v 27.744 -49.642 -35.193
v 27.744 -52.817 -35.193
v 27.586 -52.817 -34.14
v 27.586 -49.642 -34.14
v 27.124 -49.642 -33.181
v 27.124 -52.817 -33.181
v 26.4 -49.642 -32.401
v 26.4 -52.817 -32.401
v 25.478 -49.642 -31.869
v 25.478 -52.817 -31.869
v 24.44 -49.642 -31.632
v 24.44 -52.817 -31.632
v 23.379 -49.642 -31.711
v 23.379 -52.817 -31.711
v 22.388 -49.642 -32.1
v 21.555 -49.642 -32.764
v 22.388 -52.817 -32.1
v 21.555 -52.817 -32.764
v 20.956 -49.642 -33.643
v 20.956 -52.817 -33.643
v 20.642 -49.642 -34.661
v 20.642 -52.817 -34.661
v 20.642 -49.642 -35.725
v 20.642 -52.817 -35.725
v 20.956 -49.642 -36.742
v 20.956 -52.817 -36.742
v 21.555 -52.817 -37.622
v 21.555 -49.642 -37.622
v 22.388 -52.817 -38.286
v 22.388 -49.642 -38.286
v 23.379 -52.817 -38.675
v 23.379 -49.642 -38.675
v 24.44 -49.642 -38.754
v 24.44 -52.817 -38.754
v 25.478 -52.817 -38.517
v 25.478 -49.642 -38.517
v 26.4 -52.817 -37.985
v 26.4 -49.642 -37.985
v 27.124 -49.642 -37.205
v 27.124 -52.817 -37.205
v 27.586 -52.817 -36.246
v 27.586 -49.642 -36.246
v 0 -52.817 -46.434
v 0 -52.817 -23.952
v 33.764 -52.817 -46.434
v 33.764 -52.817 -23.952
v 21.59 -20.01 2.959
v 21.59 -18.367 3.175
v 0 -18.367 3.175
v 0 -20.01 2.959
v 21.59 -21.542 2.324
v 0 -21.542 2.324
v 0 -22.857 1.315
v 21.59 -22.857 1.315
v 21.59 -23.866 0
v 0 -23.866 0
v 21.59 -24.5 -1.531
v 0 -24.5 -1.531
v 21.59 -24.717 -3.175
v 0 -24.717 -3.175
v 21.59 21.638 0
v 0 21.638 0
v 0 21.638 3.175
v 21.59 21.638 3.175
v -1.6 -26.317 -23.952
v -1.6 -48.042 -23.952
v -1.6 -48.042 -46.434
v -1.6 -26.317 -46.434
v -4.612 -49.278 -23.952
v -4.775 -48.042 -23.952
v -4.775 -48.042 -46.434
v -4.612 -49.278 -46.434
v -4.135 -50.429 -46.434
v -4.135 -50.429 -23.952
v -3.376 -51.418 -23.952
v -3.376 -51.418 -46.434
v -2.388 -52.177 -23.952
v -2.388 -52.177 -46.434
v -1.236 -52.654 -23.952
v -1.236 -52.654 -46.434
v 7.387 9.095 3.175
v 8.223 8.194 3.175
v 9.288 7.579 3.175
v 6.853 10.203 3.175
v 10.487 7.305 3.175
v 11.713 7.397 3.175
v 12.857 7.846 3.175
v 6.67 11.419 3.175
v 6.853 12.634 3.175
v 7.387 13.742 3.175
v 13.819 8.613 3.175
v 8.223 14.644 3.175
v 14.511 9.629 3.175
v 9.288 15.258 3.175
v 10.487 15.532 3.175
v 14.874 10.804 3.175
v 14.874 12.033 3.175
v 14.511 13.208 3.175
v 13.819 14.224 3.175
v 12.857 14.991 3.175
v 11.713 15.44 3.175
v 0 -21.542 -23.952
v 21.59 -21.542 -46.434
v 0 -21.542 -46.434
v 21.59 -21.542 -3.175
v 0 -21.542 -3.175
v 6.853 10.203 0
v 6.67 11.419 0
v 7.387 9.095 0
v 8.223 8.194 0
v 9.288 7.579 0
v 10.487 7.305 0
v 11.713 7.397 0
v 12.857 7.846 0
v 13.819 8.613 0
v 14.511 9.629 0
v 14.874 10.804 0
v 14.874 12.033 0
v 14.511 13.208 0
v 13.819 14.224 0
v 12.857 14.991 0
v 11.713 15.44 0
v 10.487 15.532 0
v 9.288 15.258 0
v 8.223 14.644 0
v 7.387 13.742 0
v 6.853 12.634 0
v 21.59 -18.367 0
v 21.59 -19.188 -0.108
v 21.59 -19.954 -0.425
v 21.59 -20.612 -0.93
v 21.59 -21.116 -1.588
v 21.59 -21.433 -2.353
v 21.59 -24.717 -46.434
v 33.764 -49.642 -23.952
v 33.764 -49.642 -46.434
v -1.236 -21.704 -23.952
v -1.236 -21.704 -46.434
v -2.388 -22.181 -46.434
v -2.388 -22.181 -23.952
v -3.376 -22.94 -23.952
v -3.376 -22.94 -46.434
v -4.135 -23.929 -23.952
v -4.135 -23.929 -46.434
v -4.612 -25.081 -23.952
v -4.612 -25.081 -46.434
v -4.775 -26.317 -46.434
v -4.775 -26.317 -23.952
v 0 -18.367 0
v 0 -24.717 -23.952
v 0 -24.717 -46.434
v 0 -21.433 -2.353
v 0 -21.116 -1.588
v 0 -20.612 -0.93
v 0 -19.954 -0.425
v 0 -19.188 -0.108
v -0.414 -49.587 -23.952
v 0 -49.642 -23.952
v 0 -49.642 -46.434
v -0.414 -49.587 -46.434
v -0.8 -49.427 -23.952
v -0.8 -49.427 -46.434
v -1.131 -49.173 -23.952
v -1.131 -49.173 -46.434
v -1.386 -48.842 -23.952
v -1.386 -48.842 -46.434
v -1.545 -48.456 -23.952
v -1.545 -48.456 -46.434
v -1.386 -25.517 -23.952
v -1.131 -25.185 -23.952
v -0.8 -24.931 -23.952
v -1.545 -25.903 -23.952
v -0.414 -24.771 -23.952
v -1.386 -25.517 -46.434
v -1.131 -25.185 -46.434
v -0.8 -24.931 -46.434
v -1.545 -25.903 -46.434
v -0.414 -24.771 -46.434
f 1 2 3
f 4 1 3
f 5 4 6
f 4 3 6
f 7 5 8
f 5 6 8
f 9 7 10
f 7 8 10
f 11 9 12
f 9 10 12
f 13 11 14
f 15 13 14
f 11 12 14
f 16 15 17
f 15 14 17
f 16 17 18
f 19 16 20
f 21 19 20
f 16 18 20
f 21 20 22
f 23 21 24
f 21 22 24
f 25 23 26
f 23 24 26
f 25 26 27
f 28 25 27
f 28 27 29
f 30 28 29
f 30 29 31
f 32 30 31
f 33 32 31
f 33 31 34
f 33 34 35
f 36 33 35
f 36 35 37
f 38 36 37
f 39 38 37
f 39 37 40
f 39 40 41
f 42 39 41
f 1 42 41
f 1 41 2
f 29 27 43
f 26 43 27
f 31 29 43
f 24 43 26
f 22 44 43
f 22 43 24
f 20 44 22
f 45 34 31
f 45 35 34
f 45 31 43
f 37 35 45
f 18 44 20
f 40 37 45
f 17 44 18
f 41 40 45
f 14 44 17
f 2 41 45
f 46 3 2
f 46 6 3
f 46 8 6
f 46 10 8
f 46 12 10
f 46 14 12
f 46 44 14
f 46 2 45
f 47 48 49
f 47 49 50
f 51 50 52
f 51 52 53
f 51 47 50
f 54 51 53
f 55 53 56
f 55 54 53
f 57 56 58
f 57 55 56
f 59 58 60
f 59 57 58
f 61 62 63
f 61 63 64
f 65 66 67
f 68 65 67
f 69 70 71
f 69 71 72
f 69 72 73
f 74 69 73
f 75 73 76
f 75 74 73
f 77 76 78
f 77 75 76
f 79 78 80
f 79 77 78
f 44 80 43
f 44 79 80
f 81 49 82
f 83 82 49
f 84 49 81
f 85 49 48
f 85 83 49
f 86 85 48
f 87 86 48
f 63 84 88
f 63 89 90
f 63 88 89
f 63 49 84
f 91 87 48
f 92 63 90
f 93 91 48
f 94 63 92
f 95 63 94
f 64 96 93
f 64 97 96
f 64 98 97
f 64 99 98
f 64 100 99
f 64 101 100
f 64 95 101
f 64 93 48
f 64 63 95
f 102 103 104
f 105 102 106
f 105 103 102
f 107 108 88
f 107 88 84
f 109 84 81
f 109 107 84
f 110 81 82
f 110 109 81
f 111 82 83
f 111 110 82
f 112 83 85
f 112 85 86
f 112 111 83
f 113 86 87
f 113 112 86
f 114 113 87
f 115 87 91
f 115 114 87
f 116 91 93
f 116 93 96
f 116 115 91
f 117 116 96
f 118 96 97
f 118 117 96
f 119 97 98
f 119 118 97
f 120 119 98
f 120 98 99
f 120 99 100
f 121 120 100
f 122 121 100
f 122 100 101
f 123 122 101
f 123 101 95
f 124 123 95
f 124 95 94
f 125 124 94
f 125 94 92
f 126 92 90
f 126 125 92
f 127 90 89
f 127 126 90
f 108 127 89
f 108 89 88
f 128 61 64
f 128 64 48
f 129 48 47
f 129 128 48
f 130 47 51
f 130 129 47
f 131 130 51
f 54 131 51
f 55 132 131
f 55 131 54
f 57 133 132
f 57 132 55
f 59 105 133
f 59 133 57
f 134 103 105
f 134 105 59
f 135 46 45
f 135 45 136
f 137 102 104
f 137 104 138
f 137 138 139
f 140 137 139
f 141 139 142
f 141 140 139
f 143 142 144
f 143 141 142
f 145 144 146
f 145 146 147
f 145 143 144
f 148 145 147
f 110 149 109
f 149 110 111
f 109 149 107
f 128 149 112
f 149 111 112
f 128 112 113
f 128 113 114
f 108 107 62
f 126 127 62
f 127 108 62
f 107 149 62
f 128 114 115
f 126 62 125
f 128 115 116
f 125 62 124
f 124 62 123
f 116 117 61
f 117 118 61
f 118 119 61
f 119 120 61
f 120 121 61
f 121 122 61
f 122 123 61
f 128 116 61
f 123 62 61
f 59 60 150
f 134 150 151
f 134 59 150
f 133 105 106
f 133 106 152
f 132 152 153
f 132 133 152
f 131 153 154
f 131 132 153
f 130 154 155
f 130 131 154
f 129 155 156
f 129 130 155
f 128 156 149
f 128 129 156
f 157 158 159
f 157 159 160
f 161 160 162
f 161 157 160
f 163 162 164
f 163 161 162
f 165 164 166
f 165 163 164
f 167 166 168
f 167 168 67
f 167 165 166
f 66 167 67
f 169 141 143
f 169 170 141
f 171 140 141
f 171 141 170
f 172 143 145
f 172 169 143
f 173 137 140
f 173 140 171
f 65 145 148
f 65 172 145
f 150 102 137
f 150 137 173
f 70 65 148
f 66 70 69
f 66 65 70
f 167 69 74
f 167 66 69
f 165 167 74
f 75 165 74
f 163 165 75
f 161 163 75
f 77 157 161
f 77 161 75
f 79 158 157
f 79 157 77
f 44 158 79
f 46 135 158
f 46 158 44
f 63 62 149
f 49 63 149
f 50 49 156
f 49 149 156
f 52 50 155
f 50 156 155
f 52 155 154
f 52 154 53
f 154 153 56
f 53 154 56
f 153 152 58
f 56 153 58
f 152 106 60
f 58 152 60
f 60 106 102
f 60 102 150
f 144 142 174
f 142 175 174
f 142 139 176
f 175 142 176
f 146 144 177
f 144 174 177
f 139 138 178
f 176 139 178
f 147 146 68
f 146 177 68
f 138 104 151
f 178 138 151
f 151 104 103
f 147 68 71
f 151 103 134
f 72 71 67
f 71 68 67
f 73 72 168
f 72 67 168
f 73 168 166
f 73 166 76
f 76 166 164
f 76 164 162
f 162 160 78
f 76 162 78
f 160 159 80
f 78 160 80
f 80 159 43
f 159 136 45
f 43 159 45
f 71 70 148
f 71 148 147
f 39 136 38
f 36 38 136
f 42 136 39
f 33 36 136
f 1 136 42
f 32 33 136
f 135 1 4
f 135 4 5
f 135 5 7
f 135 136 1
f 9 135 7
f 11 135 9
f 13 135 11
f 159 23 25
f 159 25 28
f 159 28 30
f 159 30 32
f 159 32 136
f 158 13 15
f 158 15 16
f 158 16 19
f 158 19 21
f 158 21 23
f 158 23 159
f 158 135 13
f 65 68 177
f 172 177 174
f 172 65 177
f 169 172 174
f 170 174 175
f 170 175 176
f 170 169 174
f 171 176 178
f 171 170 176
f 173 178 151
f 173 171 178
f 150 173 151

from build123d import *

# Parameters (mm, degrees)
SKETCH1_W                    = 21.59
SKETCH1_H                    = 43.18
SKETCH1_R                    = 4.124999878
BOSS_EXTRUDE1_DEPTH          = 3.175
EDGE_FLANGE1_STRIP_W         = 19.05
EDGE_FLANGE1_STRIP_H         = 3.175
EDGE_FLANGE1_STRIP_CUT_DEPTH = 21.59
EDGE_FLANGE1_DEPTH           = 21.59
EDGE_FLANGE2_DEPTH           = 22.48154
EDGE_FLANGE2_START           = 3.175
EDGE_FLANGE2_FLAT_DEPTH      = 3.175
EDGE_FLANGE3_STRIP_W         = 15.900000204
EDGE_FLANGE3_STRIP_H         = 3.175
EDGE_FLANGE3_STRIP_CUT_DEPTH = 22.48154
EDGE_FLANGE3_DEPTH           = 22.48154
CUT_EXTRUDE2_REACH           = 96.019
SKETCH11_R                   = 3.57124


# Sheet-metal steps are written as plain solids
with BuildPart() as part:
    # Sketch1 → Boss-Extrude1 (new body)
    with BuildSketch(Plane.XY):
        with Locations((10.795, 0.048317484)):
            Rectangle(SKETCH1_W, SKETCH1_H)
        with Locations(Location((10.795, 11.418627484, 0), (0, 0, 180))):
            Circle(SKETCH1_R, mode=Mode.SUBTRACT)
    extrude(amount=BOSS_EXTRUDE1_DEPTH)

    # Edge-Flange1 strip (across the edge) → Edge-Flange1 strip cut (cut)
    with BuildSketch(Plane(origin=(21.59, -21.541682516, 0), x_dir=(0, 1, 0), z_dir=(-1, 0, 0))):
        with Locations((-6.35, -1.5875)):
            Rectangle(EDGE_FLANGE1_STRIP_W, EDGE_FLANGE1_STRIP_H)
    extrude(amount=EDGE_FLANGE1_STRIP_CUT_DEPTH, mode=Mode.SUBTRACT)

    # Edge-Flange1 section (across the edge) → Edge-Flange1 (add)
    with BuildSketch(Plane(origin=(21.59, -21.541682516, 0), x_dir=(0, 1, 0), z_dir=(-1, 0, 0))):
        with BuildLine():
            Line((-3.175, 3.175), (-3.175, 46.43374))
            Line((-3.175, 46.43374), (0, 46.43374))
            Line((0, 46.43374), (0, 3.175))
            ThreePointArc((0, 3.175), (0.92993597, 0.92993597), (3.175, 0))
            Line((3.175, 0), (3.175, -3.175))
            ThreePointArc((3.175, -3.175), (-1.315128061, -1.315128061), (-3.175, 3.175))
        make_face()
    extrude(amount=EDGE_FLANGE1_DEPTH)

    # Edge-Flange2 bend section (across the edge) → Edge-Flange2 (add)
    with BuildSketch(Plane(origin=(-1.600000102, -24.716682516, -23.9522), x_dir=(1, 0, 0), z_dir=(0, 0, -1))):
        with BuildLine():
            Line((-3.175, 1.600000102), (0, 1.600000102))
            ThreePointArc((0, 1.600000102), (0.46862918, 0.46862918), (1.600000102, 0))
            Line((1.600000102, 0), (1.600000102, -3.175))
            ThreePointArc((1.600000102, -3.175), (-1.77643485, -1.77643485), (-3.175, 1.600000102))
        make_face()
    extrude(amount=EDGE_FLANGE2_DEPTH)

    # Edge-Flange2 profile (on flange) → Edge-Flange2 flat (add)
    with BuildSketch(Plane(origin=(-1.600000102, -24.716682516, 0), x_dir=(0, 0, -1), z_dir=(-1, 0, 0)).offset(EDGE_FLANGE2_START)):
        Polygon((23.9522, 28.10002), (23.9522, 19.3675), (23.9522, 1.600000102), (46.43374, 1.600000102), (46.43374, 28.10002), align=None)
    extrude(amount=-EDGE_FLANGE2_FLAT_DEPTH)

    # Edge-Flange3 strip (across the edge) → Edge-Flange3 strip cut (cut)
    with BuildSketch(Plane(origin=(-1.600000102, -52.816702516, -23.9522), x_dir=(0, 1, 0), z_dir=(0, 0, -1))):
        with Locations((-3.175, -1.5875)):
            Rectangle(EDGE_FLANGE3_STRIP_W, EDGE_FLANGE3_STRIP_H)
    extrude(amount=EDGE_FLANGE3_STRIP_CUT_DEPTH, mode=Mode.SUBTRACT)

    # Edge-Flange3 section (across the edge) → Edge-Flange3 (add)
    with BuildSketch(Plane(origin=(-1.600000102, -52.816702516, -23.9522), x_dir=(0, 1, 0), z_dir=(0, 0, -1))):
        with BuildLine():
            Line((0, 1.600000102), (0, 35.364220102))
            Line((0, 35.364220102), (3.175, 35.364220102))
            Line((3.175, 35.364220102), (3.175, 1.600000102))
            ThreePointArc((3.175, 1.600000102), (3.64362918, 0.46862918), (4.775000102, 0))
            Line((4.775000102, 0), (4.775000102, -3.175))
            ThreePointArc((4.775000102, -3.175), (1.39856515, -1.77643485), (0, 1.600000102))
        make_face()
    extrude(amount=EDGE_FLANGE3_DEPTH)

    # Sketch11 → Cut-Extrude2 (cut, up to next)
    with BuildSketch(Plane.XZ.offset(52.816702516), mode=Mode.PRIVATE) as cut_extrude2_sk1:
        with Locations((24.17318, -35.19297)):
            Circle(SKETCH11_R)
    cut_extrude2_tool1 = extrude(cut_extrude2_sk1.sketch, amount=-CUT_EXTRUDE2_REACH, mode=Mode.PRIVATE) & part.part
    add(cut_extrude2_tool1.solids().sort_by_distance((24.17318, -52.816703, -35.19297))[0], mode=Mode.SUBTRACT)


solid = part.part
